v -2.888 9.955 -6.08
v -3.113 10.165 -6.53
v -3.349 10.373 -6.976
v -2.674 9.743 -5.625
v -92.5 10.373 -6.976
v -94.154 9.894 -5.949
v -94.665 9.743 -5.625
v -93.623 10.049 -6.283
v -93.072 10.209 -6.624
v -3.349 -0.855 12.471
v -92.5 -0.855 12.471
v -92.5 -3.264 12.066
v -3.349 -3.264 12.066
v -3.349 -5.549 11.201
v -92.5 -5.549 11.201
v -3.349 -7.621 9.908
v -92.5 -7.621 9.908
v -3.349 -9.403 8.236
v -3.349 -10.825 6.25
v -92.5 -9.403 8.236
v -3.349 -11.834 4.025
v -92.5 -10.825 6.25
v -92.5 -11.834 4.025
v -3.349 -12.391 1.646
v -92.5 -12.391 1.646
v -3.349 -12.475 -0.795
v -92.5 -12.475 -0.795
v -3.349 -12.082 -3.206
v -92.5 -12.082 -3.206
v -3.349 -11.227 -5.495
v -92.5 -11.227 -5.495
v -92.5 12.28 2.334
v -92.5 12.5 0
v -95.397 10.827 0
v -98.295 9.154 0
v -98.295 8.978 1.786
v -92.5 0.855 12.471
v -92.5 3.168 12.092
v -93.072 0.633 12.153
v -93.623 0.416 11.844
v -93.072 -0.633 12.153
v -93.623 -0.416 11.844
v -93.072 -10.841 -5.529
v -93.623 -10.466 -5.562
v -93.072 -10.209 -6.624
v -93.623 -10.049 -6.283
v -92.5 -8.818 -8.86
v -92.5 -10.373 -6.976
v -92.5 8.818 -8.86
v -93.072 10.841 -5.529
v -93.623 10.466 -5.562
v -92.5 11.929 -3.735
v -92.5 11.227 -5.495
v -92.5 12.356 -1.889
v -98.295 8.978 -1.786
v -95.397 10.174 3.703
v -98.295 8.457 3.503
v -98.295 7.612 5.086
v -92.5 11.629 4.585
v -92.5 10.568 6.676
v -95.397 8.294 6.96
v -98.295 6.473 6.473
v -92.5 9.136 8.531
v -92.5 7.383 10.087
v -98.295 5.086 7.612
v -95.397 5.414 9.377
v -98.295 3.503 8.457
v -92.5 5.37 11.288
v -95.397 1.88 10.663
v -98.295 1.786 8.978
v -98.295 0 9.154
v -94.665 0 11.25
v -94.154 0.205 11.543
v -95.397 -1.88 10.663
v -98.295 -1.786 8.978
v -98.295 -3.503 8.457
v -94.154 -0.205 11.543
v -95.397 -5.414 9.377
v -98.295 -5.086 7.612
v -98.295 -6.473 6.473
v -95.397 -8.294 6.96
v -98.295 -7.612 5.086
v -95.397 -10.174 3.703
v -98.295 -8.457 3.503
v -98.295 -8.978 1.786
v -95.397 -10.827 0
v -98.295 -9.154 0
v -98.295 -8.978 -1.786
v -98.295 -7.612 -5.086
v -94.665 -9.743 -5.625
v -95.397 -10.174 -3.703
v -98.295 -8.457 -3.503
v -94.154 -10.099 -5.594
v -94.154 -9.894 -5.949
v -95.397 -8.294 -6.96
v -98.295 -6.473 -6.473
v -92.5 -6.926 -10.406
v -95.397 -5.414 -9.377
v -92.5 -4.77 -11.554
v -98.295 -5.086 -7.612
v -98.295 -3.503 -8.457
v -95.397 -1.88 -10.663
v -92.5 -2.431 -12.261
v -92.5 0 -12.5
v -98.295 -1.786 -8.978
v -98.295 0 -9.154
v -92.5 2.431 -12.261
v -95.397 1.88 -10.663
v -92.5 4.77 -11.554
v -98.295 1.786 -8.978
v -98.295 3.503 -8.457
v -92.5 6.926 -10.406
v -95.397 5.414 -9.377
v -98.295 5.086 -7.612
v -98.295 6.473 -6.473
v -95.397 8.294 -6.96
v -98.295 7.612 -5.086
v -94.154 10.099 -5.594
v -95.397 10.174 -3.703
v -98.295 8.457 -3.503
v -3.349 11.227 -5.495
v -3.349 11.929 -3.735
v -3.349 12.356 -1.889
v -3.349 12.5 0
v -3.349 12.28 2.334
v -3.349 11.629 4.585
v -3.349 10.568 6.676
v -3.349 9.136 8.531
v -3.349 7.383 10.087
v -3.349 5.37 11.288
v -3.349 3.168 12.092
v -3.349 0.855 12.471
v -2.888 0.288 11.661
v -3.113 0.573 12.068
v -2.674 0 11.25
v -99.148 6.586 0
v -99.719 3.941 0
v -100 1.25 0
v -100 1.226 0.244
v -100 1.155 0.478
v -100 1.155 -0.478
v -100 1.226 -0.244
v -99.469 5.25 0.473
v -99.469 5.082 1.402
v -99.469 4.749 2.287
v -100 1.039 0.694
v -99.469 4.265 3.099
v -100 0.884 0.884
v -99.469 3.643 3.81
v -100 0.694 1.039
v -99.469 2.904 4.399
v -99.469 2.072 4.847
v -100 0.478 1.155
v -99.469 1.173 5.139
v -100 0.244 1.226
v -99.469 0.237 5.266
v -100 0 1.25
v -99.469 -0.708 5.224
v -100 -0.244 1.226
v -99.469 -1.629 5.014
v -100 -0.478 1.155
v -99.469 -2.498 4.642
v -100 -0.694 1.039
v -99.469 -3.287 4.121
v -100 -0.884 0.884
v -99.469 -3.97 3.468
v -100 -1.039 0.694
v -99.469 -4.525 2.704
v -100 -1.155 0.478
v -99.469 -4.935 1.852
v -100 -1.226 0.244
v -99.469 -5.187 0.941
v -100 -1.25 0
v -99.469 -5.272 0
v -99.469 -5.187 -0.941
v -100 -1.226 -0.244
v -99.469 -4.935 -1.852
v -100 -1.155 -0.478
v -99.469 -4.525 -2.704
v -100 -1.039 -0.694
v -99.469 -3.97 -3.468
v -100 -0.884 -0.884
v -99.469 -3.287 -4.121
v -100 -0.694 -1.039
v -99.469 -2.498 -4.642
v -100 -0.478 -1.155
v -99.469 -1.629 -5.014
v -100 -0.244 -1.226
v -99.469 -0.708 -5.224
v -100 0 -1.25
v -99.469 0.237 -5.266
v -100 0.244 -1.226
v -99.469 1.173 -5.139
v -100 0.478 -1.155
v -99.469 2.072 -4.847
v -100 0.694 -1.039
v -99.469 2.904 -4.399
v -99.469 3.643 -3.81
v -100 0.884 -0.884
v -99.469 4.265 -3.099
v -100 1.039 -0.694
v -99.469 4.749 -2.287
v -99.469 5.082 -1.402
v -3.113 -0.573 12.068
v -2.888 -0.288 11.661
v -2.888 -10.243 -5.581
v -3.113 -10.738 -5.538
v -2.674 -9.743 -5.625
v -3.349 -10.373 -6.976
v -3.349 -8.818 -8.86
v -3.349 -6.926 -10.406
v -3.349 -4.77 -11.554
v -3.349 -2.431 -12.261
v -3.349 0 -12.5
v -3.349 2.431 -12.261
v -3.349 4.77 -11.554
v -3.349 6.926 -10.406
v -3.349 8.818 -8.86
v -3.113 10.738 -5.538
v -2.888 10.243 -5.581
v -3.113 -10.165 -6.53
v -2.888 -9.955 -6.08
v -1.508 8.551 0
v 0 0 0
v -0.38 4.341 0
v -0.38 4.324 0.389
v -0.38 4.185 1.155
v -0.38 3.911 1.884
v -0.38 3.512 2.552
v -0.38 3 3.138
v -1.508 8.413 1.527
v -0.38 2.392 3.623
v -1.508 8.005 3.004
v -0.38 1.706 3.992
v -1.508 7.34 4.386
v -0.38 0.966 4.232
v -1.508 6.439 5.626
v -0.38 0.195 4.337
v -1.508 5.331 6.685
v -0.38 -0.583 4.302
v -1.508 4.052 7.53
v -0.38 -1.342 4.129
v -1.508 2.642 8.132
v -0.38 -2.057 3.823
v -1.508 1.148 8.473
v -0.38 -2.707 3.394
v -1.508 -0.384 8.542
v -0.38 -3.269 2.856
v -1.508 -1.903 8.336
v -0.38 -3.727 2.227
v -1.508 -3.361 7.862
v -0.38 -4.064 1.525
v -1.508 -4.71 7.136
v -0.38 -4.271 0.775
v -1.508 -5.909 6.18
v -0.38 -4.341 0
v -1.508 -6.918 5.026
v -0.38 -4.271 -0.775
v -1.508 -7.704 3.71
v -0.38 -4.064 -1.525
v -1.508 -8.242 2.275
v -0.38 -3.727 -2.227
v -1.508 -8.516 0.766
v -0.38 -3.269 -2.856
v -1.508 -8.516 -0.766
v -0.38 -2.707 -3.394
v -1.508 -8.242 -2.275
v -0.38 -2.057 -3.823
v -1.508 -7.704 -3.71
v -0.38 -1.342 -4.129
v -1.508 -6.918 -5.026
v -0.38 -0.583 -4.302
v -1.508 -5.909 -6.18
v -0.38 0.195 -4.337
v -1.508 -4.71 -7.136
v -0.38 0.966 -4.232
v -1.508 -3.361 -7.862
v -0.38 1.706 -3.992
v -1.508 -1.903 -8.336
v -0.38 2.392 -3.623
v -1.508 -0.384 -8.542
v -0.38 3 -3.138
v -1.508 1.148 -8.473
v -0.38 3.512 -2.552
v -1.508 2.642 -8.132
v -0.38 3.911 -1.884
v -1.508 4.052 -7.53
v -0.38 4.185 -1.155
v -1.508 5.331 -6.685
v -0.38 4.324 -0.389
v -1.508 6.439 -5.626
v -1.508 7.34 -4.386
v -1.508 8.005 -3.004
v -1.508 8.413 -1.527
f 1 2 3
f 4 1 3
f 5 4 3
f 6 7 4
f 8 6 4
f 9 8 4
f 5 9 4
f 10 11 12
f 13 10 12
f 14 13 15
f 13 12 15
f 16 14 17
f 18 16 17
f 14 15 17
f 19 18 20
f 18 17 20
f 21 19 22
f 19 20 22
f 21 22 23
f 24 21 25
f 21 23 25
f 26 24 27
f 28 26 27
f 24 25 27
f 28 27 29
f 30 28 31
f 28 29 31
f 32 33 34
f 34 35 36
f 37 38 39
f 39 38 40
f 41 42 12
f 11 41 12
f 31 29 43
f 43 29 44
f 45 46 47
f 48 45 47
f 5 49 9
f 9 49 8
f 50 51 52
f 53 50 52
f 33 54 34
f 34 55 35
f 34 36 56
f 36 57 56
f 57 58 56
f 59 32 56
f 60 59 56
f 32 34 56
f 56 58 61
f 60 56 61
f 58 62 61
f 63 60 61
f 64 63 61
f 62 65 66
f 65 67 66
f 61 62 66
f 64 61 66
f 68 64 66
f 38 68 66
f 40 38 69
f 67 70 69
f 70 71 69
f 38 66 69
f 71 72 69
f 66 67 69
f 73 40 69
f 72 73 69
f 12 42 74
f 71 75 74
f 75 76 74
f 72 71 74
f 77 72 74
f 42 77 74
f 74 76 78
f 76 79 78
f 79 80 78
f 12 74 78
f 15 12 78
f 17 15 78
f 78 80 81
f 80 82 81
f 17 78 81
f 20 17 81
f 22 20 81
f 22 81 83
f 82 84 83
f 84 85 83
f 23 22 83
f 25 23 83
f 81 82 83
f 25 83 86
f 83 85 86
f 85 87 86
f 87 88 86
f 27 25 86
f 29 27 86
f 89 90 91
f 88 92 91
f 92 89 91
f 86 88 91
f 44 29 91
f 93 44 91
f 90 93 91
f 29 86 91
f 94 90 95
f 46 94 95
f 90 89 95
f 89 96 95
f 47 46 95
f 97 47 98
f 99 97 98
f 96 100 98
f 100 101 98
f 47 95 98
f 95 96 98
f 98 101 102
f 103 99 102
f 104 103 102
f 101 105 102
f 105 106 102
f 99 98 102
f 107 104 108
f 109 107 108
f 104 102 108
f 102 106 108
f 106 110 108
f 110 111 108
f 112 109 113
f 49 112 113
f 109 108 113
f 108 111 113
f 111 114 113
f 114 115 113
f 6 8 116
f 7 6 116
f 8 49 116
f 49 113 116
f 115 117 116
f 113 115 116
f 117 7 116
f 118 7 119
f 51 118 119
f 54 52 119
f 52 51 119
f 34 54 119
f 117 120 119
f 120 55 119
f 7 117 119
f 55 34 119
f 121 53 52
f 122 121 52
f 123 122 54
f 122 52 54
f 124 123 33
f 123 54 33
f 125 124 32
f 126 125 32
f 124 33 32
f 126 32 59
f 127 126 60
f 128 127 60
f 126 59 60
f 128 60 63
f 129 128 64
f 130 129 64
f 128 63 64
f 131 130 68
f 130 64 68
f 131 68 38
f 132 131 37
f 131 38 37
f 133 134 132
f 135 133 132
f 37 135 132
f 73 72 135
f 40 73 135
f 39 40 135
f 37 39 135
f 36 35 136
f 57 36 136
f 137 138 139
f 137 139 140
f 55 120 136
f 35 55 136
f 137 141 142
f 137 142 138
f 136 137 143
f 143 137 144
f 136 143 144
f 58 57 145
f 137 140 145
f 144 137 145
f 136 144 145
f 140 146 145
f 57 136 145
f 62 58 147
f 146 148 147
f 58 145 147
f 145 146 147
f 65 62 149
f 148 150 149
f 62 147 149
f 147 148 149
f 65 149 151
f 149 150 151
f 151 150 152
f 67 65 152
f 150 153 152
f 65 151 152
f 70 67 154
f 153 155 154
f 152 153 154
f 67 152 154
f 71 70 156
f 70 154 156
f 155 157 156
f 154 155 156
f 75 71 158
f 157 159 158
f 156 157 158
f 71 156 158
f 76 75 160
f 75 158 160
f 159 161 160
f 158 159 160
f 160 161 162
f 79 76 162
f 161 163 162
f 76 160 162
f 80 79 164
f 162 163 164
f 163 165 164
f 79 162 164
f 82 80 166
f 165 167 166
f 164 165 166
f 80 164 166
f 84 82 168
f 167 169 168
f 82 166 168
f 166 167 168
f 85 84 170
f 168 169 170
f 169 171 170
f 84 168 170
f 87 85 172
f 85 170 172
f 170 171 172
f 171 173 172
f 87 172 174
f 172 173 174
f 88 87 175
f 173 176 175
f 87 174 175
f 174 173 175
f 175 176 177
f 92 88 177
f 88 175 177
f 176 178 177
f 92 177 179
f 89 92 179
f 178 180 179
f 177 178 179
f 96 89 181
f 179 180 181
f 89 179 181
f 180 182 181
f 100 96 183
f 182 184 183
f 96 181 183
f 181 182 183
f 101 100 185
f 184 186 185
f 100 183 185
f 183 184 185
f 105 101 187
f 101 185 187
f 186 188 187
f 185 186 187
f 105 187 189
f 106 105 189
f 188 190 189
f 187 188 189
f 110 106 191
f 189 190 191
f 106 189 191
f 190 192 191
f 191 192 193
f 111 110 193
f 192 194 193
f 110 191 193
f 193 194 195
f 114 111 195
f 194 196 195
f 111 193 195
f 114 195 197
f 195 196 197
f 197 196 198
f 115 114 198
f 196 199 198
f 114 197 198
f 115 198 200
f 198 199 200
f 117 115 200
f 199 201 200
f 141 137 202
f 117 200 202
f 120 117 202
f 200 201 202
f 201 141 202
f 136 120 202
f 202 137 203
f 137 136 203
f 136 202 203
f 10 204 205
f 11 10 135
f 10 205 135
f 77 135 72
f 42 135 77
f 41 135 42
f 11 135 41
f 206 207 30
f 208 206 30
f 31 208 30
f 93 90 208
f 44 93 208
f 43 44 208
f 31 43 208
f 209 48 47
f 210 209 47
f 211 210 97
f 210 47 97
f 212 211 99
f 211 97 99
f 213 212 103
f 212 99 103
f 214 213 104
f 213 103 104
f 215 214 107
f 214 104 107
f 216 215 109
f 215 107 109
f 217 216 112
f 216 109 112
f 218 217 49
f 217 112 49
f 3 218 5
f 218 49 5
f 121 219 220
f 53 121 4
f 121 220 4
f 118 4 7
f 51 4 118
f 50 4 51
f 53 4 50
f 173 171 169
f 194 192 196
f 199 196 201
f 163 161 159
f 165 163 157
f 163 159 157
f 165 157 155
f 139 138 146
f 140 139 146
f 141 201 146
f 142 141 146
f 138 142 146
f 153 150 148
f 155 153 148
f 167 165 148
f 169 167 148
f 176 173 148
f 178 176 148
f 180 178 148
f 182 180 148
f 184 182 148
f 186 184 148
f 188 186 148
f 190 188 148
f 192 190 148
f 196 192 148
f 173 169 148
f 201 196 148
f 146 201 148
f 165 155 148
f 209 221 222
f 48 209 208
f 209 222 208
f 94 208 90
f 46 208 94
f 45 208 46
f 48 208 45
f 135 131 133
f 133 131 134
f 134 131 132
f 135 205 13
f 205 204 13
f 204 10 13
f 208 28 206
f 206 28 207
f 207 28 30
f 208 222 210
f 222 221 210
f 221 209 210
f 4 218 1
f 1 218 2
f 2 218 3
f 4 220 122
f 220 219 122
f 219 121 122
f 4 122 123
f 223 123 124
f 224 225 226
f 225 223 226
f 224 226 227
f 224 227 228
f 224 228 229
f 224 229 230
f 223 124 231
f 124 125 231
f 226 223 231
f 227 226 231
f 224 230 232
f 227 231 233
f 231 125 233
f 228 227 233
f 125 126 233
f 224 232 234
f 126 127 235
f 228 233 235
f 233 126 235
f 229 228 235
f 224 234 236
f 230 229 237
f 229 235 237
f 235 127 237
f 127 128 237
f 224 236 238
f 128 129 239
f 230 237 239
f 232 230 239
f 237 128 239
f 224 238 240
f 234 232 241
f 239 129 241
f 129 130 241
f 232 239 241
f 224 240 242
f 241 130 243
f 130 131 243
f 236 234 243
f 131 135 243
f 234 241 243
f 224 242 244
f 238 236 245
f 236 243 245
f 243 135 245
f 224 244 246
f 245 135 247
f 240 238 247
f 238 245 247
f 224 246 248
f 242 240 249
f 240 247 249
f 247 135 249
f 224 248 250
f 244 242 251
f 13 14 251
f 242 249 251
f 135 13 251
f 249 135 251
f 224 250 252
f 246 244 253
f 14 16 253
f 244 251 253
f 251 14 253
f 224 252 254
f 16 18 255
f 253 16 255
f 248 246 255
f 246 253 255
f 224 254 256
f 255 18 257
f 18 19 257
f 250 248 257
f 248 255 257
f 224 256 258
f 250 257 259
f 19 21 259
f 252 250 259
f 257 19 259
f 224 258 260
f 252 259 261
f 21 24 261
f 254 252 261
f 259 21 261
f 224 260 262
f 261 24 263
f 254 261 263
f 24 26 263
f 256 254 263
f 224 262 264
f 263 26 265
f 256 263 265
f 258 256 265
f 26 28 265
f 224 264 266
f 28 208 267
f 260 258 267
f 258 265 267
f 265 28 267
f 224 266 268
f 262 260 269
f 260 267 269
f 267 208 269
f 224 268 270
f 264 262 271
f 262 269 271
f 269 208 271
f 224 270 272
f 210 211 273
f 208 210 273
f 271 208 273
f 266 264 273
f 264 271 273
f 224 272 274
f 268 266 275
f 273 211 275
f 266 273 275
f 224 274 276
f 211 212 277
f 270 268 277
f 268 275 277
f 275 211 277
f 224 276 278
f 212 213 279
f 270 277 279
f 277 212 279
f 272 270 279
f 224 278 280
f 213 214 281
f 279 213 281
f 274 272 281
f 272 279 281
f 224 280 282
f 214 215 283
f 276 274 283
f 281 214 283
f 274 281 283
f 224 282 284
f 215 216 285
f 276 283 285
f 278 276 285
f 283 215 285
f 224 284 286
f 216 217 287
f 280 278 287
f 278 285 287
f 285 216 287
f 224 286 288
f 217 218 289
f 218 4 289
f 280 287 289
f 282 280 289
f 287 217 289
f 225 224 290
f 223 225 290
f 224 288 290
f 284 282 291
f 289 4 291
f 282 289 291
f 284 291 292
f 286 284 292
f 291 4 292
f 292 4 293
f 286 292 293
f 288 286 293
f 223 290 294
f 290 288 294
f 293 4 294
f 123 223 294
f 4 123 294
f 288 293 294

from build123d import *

# Parameters (mm, degrees)
CUT_EXTRUDE1_DEPTH = 102.550480058
CIRPATTERN2_COUNT  = 3


with BuildPart() as part:
    # Sketch1 → Base-Revolve (revolve)
    with BuildSketch(Plane.XY):
        with BuildLine():
            Line((-92.5, 12.5), (-98.294957108, 9.154279954))
            ThreePointArc((-98.294957108, 9.154279954), (-99.46916936, 5.271532335), (-100, 1.25))
            Line((-100, 1.25), (-100, 0))
            Line((-100, 0), (0, 0))
            ThreePointArc((0, 0), (-0.851854343, 6.470476128), (-3.349364905, 12.5))
            Line((-3.349364905, 12.5), (-92.5, 12.5))
        make_face()
    revolve(axis=Axis((-117, 0, 0), (1, 0, 0)))

    # Sketch2 → Cut-Extrude1 (cut, through all)
    with BuildSketch(Plane(origin=(0, 0, 0), x_dir=(0, 0, -1), z_dir=(1, 0, 0))):
        Polygon((-11.25, 0), (-12.5, 0.875259423), (-12.5, -0.875259423), align=None)
    cut_extrude1 = extrude(amount=-CUT_EXTRUDE1_DEPTH, mode=Mode.SUBTRACT)

    # CirPattern2: Cut-Extrude1 ×3 about axis
    cirpattern2_axis = Axis((0, 0, 0), (1, 0, 0))
    for i in range(1, CIRPATTERN2_COUNT):
        add(cut_extrude1.rotate(cirpattern2_axis, i * 360 / CIRPATTERN2_COUNT), mode=Mode.SUBTRACT)


solid = part.part
